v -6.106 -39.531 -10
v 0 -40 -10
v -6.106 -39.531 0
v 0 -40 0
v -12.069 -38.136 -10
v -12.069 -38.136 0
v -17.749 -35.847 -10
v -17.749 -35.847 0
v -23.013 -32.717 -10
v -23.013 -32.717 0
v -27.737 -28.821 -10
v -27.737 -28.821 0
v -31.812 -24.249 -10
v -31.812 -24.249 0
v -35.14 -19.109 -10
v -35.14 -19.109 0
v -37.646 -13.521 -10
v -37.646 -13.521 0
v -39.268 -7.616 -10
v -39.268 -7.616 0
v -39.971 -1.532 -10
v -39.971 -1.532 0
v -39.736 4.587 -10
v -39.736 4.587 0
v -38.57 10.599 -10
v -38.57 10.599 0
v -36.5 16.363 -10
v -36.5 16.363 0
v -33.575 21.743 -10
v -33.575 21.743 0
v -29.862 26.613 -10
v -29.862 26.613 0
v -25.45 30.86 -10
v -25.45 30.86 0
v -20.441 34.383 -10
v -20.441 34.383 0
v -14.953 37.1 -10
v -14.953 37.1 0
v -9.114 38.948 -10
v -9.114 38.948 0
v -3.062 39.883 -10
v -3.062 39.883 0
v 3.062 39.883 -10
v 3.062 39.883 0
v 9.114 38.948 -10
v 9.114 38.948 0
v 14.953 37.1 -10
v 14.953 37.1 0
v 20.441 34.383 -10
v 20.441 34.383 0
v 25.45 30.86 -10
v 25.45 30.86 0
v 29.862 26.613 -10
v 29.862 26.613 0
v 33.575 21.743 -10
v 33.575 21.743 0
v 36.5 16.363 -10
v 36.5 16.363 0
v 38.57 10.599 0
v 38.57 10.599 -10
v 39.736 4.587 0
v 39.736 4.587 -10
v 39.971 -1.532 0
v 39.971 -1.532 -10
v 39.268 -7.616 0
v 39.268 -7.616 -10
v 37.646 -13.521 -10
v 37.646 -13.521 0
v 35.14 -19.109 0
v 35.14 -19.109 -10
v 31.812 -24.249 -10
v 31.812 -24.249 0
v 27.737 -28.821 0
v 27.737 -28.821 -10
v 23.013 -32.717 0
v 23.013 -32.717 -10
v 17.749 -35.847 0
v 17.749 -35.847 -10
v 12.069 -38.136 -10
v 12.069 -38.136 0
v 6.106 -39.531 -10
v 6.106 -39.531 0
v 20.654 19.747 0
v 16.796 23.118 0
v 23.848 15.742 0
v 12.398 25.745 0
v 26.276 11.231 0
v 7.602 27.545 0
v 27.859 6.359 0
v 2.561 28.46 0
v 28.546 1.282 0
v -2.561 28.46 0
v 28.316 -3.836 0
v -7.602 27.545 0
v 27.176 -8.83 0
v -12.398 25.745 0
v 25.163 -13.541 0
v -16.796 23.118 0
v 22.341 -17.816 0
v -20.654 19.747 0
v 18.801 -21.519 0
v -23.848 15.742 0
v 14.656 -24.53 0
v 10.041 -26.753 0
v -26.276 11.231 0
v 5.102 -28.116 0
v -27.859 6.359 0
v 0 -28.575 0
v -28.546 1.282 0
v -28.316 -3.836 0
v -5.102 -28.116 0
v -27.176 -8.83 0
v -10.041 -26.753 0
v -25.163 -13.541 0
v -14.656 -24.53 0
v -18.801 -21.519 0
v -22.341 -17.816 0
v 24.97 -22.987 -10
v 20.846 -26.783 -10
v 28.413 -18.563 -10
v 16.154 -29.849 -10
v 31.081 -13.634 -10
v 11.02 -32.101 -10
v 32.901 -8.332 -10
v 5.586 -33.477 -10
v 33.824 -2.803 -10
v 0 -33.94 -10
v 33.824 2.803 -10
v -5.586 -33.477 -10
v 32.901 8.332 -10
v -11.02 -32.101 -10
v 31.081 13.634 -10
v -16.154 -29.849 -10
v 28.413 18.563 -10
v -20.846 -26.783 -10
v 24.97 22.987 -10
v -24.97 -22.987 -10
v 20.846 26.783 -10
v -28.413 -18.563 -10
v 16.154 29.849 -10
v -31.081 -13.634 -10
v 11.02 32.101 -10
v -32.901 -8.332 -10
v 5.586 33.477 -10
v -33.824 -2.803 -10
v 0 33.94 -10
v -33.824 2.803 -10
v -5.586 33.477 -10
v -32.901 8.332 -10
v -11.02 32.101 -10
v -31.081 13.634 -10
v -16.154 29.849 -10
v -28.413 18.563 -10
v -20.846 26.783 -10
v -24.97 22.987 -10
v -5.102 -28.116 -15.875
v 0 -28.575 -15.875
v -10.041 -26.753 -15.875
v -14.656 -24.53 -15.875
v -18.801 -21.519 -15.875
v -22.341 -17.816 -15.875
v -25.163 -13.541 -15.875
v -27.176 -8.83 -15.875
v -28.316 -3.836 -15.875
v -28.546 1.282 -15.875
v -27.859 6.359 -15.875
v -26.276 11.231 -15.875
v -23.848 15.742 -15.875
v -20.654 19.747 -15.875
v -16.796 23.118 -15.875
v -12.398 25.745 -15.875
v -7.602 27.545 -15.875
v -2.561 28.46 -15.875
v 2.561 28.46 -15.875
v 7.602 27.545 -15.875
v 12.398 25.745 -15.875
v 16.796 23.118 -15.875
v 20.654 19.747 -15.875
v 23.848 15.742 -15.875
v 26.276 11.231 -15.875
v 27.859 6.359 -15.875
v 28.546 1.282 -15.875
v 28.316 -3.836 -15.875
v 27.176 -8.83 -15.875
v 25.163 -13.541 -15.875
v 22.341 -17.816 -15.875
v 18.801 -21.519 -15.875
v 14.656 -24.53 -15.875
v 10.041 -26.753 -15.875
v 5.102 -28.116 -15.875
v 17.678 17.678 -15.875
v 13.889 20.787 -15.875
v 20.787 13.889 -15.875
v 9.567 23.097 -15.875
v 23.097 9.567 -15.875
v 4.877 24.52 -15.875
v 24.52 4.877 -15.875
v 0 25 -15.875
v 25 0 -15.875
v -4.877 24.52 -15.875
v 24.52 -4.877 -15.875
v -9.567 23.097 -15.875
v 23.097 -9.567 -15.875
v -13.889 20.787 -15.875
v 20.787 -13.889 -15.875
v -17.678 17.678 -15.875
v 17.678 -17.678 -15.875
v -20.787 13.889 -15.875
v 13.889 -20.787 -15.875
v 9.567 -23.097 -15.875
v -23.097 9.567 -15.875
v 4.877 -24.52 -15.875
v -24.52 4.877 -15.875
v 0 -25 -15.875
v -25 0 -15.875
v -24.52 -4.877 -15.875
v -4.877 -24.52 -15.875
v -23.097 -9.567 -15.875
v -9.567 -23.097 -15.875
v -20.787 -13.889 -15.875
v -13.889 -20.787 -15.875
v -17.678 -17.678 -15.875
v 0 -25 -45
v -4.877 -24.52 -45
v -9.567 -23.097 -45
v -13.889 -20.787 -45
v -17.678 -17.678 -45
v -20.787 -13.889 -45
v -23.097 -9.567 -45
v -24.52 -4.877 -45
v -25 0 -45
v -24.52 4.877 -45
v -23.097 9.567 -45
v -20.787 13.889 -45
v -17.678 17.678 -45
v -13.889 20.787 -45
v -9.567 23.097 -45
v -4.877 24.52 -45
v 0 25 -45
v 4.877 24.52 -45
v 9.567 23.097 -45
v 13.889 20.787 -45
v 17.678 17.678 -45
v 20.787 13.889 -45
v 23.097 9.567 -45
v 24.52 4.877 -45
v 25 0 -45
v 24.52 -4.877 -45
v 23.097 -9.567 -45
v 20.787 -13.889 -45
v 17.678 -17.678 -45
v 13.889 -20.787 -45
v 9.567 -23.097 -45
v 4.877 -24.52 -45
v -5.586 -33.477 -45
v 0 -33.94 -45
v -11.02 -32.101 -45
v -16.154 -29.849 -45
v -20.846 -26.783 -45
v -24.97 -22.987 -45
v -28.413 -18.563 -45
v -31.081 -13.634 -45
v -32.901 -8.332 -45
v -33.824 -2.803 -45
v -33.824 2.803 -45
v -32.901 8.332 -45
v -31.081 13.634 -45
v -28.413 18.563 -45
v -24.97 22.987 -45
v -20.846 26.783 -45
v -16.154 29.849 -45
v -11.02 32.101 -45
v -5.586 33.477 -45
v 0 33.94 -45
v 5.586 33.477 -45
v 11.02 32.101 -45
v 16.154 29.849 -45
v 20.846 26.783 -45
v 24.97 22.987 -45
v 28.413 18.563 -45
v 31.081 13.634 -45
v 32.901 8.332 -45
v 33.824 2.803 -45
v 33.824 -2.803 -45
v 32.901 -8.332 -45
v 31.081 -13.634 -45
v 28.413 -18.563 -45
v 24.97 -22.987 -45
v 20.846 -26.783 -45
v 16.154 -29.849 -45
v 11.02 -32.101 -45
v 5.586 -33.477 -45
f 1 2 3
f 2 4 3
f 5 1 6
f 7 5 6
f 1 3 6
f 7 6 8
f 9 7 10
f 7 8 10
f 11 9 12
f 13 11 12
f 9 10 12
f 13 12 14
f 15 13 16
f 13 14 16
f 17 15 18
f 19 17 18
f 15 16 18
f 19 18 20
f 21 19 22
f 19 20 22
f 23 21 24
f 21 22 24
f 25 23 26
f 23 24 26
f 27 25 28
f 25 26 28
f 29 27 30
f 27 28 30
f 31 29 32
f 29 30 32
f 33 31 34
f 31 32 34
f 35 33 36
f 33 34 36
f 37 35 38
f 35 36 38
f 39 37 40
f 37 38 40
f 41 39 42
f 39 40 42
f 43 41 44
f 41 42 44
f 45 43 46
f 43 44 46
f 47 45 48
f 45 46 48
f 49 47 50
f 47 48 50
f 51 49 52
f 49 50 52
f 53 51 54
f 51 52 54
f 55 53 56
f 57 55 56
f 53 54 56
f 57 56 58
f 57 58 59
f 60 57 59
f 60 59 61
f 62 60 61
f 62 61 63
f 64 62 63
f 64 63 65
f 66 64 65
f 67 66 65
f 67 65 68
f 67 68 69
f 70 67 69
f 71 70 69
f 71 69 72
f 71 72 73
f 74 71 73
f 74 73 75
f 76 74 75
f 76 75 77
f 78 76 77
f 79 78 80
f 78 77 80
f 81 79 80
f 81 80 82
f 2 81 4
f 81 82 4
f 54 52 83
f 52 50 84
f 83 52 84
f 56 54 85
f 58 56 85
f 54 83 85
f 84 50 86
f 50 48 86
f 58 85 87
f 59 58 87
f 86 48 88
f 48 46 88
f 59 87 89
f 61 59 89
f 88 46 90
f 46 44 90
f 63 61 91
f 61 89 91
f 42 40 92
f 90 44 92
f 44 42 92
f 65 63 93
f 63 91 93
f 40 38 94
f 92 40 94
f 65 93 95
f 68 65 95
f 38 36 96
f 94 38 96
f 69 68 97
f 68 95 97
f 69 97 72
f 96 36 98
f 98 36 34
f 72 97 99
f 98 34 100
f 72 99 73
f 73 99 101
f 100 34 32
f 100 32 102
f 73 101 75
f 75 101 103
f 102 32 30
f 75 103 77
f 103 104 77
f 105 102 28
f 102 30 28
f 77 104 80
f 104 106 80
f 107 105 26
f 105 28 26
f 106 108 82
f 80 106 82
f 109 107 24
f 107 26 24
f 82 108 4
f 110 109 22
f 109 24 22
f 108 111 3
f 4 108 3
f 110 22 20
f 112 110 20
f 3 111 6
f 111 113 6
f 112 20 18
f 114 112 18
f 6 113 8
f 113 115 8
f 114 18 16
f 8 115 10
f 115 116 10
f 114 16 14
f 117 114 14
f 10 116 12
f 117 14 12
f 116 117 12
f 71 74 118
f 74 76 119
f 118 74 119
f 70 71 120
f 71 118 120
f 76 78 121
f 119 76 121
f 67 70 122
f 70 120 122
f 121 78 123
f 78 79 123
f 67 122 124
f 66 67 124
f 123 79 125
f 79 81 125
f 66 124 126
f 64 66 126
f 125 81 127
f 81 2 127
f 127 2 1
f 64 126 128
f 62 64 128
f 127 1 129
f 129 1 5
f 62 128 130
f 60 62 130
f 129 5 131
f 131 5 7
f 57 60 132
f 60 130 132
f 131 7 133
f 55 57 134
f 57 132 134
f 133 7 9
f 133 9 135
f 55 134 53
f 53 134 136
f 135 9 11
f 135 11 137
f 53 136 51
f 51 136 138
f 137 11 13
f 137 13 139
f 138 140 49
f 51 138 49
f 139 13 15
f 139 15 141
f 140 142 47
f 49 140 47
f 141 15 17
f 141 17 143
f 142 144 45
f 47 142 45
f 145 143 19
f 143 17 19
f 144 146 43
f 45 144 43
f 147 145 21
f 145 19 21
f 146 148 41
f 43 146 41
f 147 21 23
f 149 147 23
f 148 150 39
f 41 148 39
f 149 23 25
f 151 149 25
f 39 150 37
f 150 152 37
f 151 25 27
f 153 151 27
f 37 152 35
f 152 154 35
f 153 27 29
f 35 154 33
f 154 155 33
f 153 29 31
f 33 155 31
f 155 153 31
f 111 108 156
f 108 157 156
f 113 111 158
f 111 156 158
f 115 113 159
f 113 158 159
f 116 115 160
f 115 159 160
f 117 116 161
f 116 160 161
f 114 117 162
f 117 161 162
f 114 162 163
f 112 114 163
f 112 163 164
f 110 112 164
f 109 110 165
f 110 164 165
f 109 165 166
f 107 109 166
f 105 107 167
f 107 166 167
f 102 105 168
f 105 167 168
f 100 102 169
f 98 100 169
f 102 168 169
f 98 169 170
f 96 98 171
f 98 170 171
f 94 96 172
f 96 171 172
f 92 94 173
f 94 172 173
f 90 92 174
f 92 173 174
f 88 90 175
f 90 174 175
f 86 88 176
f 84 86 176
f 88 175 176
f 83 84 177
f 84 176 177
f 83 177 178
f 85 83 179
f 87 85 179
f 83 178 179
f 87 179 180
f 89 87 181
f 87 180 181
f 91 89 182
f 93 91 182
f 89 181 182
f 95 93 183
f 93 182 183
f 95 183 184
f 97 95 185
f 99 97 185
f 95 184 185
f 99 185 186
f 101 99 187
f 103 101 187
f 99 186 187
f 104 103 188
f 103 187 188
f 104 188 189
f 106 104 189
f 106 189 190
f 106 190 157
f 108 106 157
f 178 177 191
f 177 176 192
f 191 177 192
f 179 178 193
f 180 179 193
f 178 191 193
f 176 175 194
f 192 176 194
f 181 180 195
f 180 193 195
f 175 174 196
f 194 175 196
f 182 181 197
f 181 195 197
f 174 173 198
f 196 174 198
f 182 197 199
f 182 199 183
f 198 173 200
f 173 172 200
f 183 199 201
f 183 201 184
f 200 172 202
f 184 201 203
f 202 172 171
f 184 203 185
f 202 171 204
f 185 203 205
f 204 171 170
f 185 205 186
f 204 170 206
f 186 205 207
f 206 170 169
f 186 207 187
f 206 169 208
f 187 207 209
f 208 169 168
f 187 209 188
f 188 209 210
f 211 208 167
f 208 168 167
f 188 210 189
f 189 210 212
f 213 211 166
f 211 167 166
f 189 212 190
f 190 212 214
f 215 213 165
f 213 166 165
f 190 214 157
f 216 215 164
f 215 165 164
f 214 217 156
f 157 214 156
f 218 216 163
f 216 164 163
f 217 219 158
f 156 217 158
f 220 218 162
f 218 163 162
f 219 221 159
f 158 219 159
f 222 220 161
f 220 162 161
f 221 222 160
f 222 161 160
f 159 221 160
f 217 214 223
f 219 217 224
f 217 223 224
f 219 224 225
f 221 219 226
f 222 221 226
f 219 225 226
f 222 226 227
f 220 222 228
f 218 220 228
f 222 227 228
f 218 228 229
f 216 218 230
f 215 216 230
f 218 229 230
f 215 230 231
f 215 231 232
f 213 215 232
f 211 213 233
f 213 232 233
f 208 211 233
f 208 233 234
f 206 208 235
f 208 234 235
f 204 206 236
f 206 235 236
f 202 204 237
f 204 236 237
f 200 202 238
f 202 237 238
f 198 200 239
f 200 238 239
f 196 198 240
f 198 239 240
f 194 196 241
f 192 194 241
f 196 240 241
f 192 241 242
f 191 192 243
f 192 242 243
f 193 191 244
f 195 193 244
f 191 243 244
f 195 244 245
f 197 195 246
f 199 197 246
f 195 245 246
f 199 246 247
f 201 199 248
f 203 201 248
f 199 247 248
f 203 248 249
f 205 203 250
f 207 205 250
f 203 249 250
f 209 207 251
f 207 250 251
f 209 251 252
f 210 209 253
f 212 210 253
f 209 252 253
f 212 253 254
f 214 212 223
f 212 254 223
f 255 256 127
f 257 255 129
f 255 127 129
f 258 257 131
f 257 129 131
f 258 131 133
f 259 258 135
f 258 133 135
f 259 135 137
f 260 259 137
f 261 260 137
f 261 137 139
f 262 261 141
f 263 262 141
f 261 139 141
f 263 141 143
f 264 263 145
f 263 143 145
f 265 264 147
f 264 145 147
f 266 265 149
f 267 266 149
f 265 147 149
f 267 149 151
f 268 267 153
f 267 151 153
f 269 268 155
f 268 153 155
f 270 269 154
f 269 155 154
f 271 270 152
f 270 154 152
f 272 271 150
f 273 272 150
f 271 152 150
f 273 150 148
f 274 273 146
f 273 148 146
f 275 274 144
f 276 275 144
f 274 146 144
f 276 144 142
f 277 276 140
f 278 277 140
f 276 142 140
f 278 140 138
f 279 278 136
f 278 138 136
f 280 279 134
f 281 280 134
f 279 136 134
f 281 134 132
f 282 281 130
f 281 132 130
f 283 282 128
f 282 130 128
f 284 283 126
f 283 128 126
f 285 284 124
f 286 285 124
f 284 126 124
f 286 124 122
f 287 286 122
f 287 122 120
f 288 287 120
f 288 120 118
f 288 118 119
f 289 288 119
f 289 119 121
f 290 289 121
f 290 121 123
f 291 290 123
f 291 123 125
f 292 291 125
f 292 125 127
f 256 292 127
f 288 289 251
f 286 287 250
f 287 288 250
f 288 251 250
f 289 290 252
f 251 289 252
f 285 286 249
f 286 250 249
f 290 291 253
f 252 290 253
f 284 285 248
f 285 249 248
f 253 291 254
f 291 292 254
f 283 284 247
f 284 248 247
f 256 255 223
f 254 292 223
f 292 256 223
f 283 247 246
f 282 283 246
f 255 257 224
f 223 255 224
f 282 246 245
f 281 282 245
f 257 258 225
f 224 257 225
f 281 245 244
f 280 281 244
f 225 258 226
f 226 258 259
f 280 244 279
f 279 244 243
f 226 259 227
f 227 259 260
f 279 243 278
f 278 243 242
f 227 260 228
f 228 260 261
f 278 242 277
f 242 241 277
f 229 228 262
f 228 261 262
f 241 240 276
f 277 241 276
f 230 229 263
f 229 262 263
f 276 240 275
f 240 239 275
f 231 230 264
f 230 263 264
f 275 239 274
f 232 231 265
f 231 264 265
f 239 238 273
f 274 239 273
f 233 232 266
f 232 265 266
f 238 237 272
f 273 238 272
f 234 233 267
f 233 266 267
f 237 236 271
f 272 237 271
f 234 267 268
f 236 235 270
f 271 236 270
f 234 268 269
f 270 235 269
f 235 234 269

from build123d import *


with BuildPart() as part:
    # Esboço1 → Revolução1 (revolve)
    with BuildSketch(Plane(origin=(0, 0, 0), x_dir=(0, 0, -1), z_dir=(1, 0, 0)), mode=Mode.PRIVATE) as revolu_o1_sk:
        Polygon((45, 25), (45, 33.94), (10, 33.94), (10, 40), (0, 40), (0, 28.575), (15.875, 28.575), (15.875, 25), align=None)
    revolve(revolu_o1_sk.sketch.rotate(Axis((0, 0, 0), (0, 0, -1)), 180), axis=Axis((0, 0, 0), (0, 0, -1)))


solid = part.part
